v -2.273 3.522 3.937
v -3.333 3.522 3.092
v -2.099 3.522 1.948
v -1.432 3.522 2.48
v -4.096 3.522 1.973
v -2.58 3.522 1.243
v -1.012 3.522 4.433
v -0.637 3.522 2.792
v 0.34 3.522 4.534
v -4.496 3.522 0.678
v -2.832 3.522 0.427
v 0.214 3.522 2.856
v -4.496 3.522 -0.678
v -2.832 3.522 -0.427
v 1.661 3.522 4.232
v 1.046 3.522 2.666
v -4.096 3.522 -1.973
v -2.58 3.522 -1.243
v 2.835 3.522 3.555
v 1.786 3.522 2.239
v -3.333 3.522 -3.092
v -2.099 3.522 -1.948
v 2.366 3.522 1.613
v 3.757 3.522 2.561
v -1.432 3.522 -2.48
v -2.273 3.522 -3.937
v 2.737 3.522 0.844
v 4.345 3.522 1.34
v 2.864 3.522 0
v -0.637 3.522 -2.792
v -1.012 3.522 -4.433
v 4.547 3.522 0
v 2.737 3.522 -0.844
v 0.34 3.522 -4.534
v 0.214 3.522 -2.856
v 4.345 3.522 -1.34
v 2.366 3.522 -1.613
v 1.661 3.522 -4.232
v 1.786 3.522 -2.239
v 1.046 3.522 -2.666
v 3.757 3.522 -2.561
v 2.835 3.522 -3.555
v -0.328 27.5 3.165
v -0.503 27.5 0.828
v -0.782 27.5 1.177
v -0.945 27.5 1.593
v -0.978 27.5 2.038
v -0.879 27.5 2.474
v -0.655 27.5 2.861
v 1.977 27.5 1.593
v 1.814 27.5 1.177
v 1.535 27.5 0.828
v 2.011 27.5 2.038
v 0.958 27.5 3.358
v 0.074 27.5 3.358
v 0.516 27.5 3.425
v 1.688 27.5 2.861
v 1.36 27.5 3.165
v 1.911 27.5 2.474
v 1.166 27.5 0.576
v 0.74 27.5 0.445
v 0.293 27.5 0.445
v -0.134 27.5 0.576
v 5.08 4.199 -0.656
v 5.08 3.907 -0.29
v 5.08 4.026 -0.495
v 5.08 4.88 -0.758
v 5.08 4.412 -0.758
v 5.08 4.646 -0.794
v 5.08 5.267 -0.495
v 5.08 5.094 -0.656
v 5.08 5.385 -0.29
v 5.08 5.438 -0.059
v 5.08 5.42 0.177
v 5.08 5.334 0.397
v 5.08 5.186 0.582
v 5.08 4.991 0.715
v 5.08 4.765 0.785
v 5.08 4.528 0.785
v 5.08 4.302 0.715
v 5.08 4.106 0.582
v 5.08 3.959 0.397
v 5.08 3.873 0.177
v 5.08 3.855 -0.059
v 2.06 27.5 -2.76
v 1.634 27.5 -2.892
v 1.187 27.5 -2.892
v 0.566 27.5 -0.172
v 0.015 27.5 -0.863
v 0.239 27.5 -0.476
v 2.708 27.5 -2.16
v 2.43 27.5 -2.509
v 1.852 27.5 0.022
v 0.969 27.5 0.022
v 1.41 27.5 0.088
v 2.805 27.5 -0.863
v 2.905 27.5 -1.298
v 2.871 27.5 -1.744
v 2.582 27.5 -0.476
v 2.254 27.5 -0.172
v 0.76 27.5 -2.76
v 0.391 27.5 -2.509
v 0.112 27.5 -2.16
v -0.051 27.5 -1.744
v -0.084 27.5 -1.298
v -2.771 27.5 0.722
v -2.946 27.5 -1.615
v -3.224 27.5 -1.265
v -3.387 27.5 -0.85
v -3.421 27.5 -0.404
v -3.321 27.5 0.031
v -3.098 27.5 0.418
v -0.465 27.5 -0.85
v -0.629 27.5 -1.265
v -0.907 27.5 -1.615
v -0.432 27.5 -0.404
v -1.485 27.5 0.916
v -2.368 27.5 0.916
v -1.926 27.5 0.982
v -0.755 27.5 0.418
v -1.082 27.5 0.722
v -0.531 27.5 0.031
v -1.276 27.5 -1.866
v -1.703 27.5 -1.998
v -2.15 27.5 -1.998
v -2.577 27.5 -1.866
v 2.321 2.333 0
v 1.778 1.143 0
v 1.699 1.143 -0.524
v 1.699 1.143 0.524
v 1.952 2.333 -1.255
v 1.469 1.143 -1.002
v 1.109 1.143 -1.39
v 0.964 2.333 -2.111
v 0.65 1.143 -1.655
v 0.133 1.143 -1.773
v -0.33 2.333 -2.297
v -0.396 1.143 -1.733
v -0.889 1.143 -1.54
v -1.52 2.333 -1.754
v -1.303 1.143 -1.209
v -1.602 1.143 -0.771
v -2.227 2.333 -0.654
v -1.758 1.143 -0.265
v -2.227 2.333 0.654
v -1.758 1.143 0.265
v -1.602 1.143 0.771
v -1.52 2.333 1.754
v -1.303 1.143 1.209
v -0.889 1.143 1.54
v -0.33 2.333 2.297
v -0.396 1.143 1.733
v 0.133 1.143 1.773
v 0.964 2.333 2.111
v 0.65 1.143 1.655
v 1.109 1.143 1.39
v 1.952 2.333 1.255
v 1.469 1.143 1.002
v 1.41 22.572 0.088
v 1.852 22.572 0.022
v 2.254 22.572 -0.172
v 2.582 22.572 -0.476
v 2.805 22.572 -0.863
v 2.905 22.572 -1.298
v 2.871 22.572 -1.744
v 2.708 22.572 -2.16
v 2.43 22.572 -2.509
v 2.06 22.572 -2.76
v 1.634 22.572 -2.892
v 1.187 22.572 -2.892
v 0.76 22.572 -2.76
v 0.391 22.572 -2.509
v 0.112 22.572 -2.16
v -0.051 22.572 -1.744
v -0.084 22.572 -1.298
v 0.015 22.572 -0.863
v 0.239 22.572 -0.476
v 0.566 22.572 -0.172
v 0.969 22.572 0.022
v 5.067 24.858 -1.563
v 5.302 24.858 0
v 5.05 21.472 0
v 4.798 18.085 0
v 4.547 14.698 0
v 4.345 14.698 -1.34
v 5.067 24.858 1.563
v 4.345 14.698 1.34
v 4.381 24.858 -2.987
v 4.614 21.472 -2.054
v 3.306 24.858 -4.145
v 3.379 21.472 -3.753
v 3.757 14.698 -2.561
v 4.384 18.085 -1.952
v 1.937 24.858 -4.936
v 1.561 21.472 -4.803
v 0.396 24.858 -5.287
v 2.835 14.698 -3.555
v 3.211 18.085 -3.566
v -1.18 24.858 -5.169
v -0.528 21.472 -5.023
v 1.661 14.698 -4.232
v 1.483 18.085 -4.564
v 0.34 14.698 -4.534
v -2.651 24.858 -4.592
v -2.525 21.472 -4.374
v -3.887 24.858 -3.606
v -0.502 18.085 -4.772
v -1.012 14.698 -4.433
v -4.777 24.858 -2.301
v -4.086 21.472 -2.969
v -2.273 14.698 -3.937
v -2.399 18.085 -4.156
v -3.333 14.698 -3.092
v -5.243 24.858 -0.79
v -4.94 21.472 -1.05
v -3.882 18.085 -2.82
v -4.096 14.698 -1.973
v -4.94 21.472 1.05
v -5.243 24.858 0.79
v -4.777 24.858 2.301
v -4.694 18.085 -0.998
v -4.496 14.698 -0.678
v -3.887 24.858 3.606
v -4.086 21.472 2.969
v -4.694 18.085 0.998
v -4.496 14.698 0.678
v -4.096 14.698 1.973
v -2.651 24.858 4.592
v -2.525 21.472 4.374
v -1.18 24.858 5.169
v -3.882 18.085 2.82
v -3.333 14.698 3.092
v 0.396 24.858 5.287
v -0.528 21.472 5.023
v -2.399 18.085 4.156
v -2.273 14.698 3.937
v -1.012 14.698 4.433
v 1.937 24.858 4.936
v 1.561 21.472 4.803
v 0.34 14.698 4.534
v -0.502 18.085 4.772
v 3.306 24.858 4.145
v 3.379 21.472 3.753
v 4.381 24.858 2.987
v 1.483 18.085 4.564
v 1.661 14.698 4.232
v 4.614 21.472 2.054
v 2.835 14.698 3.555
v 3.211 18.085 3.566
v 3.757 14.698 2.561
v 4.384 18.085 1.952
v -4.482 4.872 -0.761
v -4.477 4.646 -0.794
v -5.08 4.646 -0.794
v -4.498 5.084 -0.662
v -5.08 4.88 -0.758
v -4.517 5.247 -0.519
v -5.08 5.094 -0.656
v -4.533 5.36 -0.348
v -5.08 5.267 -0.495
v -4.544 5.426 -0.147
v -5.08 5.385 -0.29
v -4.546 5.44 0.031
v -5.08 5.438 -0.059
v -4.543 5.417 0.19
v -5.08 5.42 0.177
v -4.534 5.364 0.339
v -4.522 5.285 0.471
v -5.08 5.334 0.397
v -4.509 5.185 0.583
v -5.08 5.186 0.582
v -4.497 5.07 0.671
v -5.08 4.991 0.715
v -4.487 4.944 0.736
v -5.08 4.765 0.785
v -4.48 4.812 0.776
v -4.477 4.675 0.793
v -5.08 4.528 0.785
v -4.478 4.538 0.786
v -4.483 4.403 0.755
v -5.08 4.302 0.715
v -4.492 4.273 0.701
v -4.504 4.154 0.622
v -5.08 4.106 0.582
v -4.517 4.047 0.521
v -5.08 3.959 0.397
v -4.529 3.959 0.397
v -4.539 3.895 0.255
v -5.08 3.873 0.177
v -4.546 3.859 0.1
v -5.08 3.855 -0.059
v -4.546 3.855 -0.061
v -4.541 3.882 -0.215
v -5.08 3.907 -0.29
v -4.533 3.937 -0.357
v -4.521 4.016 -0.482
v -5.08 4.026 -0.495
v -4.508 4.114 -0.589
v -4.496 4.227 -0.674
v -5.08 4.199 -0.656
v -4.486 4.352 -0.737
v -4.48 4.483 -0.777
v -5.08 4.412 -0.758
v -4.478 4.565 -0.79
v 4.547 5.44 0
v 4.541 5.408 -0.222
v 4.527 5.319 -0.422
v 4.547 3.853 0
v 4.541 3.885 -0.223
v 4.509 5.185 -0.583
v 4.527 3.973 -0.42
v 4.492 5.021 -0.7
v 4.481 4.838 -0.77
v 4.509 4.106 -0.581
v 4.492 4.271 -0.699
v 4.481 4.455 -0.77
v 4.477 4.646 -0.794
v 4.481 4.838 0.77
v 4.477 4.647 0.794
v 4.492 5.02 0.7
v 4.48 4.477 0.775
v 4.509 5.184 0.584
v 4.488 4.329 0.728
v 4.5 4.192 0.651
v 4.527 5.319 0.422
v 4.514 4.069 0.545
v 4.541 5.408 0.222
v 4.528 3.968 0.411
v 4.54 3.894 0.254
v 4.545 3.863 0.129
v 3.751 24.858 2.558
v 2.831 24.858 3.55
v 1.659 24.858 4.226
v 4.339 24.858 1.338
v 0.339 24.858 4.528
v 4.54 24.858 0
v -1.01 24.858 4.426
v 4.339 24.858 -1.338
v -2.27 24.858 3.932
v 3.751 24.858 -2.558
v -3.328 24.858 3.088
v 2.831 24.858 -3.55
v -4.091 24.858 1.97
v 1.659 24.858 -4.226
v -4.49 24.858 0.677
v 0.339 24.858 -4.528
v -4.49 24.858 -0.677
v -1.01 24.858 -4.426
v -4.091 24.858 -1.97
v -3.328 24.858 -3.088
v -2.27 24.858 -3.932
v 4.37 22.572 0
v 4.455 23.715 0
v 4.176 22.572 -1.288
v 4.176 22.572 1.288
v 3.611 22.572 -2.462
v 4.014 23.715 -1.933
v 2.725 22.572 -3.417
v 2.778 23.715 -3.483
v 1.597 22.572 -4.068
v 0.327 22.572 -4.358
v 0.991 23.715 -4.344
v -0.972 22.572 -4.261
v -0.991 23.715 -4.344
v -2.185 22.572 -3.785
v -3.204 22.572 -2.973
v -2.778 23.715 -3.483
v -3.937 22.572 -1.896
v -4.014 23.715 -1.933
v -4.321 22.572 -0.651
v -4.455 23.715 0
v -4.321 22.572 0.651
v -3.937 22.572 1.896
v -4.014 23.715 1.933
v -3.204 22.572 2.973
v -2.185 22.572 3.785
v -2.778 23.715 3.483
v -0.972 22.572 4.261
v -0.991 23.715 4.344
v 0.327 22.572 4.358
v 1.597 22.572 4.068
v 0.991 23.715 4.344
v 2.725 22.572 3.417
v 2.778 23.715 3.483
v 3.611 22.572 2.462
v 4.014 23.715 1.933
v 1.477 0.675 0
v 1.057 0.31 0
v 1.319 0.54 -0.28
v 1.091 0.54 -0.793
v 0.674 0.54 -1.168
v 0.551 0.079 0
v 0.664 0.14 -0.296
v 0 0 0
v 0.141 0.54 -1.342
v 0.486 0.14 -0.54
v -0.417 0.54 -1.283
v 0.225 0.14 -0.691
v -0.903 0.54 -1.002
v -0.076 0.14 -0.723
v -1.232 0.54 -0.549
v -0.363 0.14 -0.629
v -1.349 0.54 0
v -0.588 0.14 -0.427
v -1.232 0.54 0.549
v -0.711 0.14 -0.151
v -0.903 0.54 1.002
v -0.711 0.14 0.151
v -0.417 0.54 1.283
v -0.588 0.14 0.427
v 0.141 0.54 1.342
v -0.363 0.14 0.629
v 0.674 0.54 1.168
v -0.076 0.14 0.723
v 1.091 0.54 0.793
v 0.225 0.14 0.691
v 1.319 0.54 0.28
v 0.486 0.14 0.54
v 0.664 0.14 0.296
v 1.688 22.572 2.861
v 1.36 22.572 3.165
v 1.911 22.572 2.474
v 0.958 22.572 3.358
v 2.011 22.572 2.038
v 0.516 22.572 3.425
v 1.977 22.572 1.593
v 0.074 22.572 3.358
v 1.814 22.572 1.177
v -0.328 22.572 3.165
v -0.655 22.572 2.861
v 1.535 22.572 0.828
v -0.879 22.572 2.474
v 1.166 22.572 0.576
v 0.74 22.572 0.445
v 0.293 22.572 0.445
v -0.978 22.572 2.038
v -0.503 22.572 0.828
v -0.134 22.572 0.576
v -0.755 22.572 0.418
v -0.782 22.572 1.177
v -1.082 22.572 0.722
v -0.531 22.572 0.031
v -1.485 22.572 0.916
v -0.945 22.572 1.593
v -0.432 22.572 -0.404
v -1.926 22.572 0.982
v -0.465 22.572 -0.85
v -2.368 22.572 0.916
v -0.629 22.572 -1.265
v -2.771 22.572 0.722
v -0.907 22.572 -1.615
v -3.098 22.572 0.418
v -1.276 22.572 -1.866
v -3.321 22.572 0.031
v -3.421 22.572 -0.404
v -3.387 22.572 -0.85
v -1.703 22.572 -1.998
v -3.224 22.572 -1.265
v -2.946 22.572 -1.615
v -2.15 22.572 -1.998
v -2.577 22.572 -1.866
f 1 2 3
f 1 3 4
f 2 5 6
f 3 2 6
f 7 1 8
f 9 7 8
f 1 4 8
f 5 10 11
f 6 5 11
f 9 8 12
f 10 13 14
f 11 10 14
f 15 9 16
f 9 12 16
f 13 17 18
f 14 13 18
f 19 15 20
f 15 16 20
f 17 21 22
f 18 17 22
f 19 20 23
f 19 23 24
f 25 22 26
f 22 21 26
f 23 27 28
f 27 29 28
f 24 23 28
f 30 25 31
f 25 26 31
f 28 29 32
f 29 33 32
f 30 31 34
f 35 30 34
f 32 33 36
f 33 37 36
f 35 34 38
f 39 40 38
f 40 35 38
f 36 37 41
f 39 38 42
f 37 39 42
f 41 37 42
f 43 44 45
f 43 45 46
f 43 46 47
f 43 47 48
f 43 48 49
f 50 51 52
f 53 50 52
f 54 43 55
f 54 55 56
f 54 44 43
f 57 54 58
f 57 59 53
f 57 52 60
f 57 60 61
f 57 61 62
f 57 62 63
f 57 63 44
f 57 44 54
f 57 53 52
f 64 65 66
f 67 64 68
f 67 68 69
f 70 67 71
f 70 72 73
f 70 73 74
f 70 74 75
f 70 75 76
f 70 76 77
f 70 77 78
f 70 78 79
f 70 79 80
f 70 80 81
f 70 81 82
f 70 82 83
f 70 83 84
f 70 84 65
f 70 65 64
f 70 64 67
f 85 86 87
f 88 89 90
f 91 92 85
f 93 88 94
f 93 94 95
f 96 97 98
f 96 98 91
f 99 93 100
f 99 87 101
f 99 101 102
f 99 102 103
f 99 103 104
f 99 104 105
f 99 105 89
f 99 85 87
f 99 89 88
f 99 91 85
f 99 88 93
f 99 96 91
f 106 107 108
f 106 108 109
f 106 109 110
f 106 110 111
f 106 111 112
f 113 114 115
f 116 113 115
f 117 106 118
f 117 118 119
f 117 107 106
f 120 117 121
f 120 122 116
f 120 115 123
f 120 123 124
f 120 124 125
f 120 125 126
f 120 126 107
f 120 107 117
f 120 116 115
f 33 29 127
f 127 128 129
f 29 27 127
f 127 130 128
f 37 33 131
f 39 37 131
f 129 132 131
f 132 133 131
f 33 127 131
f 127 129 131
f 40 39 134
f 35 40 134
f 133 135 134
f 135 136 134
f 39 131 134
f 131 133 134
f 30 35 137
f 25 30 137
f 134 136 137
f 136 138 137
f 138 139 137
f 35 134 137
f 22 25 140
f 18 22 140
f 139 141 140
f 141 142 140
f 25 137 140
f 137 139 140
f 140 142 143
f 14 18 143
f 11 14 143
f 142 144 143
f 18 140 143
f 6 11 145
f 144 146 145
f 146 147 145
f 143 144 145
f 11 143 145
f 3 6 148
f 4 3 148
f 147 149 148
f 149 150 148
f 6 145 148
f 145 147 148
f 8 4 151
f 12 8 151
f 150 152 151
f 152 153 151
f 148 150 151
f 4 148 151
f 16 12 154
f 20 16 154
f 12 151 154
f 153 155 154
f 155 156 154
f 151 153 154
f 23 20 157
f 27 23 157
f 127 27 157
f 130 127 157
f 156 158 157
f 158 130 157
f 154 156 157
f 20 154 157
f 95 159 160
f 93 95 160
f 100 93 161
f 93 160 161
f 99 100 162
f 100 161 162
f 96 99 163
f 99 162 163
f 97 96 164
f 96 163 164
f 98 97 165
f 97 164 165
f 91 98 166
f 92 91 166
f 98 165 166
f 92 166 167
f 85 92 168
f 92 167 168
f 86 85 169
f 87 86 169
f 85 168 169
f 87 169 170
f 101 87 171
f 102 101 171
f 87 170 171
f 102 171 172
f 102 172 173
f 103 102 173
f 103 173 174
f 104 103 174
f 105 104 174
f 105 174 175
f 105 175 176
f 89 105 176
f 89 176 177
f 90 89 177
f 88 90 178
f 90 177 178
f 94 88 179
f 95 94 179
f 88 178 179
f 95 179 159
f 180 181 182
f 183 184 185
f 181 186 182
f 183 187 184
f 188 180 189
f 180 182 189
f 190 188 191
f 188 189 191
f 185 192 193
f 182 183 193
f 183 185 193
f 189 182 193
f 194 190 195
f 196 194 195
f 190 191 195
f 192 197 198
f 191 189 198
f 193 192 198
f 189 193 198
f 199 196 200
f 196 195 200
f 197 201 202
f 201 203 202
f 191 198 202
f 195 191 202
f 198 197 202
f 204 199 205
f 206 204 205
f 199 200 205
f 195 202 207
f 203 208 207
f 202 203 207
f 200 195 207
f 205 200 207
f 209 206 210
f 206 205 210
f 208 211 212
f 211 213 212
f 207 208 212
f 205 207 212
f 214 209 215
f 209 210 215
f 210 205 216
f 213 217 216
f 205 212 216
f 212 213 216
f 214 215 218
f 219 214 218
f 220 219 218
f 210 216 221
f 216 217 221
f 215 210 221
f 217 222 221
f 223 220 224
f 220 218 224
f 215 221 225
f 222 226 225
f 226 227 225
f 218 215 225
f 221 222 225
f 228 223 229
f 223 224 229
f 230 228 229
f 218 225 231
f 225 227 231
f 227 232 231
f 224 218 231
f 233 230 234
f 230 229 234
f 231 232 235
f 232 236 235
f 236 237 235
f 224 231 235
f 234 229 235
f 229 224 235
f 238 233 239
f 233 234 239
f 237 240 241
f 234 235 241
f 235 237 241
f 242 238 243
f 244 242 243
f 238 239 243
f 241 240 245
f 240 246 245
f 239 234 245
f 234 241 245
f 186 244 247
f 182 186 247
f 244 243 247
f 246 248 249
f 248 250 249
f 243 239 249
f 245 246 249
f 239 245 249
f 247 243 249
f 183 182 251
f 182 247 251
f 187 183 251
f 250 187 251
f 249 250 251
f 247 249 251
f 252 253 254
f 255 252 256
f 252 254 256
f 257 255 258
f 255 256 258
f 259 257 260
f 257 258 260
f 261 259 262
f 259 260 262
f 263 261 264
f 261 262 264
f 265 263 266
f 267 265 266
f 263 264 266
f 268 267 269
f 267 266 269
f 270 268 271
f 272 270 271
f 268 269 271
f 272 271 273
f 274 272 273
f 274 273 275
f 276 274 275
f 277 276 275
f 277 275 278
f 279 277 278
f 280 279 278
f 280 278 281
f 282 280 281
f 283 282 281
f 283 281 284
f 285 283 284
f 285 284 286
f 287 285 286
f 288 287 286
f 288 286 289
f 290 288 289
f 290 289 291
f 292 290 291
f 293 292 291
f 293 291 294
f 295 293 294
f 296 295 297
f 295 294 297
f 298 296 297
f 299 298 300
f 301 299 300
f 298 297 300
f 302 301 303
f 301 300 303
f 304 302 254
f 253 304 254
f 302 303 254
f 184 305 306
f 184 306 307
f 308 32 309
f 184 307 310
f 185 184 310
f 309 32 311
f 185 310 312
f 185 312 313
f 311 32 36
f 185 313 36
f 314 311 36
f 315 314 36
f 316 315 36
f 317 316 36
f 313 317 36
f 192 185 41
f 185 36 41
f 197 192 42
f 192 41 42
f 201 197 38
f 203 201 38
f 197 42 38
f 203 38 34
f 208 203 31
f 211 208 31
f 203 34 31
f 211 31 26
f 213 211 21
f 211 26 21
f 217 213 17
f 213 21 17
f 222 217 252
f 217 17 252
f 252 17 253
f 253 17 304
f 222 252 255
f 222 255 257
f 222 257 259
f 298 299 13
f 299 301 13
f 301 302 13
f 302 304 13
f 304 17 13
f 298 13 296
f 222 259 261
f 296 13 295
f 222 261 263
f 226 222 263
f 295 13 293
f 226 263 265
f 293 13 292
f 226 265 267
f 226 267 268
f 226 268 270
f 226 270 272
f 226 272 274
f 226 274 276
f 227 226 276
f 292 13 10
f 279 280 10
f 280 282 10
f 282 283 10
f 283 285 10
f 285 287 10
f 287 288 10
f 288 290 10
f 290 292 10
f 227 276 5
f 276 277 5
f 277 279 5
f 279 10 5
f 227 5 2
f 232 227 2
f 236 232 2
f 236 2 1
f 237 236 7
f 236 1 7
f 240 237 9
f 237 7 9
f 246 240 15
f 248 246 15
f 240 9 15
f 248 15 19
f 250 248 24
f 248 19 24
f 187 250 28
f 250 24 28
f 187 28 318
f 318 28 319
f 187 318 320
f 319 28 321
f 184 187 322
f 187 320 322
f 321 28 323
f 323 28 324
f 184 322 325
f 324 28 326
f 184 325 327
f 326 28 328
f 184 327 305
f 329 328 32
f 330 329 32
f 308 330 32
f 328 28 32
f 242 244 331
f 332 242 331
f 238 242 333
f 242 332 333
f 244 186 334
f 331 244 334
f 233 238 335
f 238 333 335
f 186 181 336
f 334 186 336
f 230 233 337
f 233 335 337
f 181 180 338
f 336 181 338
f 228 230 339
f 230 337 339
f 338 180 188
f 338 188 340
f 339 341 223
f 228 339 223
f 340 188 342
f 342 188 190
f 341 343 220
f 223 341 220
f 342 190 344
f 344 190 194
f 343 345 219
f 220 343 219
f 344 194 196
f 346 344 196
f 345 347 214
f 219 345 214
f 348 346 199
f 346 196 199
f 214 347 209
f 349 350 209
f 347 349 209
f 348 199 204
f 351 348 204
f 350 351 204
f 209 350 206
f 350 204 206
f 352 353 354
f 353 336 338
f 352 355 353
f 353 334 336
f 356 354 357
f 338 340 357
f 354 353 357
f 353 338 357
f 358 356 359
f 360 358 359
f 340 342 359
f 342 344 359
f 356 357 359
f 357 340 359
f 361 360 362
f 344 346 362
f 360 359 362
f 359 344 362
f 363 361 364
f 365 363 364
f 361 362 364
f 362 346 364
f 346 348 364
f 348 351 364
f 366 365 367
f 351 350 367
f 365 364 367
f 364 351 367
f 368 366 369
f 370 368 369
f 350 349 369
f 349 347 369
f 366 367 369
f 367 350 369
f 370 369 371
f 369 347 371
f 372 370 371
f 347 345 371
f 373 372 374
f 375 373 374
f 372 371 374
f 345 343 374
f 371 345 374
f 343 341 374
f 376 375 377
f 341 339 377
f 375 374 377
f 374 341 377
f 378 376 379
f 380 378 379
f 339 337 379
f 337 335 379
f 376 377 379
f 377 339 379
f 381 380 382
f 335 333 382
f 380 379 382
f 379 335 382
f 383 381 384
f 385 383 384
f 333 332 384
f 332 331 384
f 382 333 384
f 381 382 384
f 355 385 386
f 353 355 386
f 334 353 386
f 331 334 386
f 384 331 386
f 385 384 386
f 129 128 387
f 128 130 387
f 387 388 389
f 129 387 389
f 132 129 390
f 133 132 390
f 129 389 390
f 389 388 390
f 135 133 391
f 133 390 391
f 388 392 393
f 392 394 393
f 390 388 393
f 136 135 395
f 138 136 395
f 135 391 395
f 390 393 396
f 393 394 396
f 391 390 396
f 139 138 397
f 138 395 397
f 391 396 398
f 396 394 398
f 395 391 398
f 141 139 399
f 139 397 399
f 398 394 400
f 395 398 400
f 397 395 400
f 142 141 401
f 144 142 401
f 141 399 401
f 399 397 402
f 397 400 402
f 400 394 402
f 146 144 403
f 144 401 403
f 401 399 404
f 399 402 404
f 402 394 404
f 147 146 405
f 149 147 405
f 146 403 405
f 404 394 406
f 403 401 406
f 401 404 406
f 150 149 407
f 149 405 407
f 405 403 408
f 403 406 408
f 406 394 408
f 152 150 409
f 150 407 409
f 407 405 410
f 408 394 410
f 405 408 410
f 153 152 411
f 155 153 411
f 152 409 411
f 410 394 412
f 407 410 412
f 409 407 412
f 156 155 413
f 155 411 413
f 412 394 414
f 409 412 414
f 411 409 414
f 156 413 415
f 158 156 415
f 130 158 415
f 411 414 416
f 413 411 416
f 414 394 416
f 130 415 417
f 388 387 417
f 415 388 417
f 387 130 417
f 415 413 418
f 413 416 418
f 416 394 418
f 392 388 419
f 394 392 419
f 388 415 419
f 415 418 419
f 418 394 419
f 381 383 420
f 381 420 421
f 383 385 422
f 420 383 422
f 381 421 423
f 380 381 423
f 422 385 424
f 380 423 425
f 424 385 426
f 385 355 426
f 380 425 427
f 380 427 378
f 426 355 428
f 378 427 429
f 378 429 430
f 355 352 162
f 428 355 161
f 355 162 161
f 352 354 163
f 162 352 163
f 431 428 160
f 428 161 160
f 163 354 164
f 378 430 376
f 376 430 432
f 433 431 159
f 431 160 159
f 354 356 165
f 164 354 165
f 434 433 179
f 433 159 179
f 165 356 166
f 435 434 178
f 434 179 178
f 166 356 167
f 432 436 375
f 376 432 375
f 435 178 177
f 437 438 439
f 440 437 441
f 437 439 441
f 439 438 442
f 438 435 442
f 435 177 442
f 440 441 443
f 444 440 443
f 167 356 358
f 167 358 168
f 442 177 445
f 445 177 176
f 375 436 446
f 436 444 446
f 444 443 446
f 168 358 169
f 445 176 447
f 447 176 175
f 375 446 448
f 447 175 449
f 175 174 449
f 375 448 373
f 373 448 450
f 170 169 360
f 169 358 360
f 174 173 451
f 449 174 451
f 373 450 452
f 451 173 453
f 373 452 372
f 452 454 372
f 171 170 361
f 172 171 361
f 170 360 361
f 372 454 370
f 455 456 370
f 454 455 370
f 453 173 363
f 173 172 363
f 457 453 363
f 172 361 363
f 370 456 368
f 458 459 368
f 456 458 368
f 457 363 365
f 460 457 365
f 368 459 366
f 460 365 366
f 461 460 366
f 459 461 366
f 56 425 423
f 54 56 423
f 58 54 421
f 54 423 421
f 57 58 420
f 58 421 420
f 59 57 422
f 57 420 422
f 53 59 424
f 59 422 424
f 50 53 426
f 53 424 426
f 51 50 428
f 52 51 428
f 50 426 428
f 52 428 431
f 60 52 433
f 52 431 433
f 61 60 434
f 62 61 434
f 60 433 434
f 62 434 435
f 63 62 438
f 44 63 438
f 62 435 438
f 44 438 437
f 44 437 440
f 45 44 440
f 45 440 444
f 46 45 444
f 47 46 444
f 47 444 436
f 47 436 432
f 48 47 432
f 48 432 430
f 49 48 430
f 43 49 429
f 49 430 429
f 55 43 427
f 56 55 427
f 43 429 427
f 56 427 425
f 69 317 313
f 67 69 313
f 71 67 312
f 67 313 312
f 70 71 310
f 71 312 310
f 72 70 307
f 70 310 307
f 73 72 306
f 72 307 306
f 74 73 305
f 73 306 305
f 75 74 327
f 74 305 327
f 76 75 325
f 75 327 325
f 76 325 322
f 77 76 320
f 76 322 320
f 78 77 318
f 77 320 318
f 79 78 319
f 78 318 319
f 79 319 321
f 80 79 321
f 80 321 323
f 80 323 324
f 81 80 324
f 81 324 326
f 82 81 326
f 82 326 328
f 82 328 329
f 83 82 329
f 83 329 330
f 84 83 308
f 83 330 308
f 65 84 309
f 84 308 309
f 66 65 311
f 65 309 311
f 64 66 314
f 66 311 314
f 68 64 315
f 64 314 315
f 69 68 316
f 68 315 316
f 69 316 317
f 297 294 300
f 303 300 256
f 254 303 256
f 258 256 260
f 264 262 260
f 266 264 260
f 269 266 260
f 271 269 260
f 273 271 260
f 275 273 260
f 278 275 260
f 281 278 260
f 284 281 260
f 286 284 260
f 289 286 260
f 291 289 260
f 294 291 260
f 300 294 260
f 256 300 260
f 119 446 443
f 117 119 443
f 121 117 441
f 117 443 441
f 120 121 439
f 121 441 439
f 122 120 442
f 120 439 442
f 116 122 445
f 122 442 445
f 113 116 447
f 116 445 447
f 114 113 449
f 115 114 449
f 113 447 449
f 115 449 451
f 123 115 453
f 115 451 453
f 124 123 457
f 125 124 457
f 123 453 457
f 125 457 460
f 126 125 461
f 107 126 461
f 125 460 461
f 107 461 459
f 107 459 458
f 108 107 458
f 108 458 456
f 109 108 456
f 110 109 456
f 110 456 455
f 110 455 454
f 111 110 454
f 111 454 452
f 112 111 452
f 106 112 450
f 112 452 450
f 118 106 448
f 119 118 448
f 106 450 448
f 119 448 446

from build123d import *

# Parameters (mm, degrees)
BOSS_EXTRUDE1_DEPTH      = 5.08
BOSS_EXTRUDE1_DEPTH_BACK = 5.08
SKETCH2_R                = 0.79375
SKETCH3_R                = 1.4986
BOSS_EXTRUDE3_DEPTH      = 4.9276


with BuildPart() as part:
    # Sketch1 → Revolve1 (revolve)
    with BuildSketch(Plane.XY):
        with BuildLine():
            Line((0, 0), (0, 22.572427826))
            Line((0, 22.572427826), (4.37022875, 22.572427826))
            Line((4.37022875, 22.572427826), (4.54025, 24.858427826))
            Line((4.54025, 24.858427826), (5.30225, 24.858427826))
            Line((5.30225, 24.858427826), (4.5466, 14.698427826))
            Line((4.5466, 14.698427826), (4.5466, 3.522427826))
            Line((4.5466, 3.522427826), (2.86385, 3.522427826))
            Line((2.86385, 3.522427826), (1.778, 1.143))
            ThreePointArc((1.778, 1.143), (1.056850628, 0.310399023), (0, 0))
        make_face()
    revolve(axis=Axis((0, 0, 0), (0, 1, 0)))

    # Sketch2 → Boss-Extrude1 (add, two sides: drawn at the far end of the back side and taken through both)
    with BuildSketch(Plane(origin=(0, 0, 0), x_dir=(0, 0, -1), z_dir=(1, 0, 0)).offset(-BOSS_EXTRUDE1_DEPTH_BACK)):
        with Locations((0, 4.646377826)):
            Circle(SKETCH2_R)
    extrude(amount=BOSS_EXTRUDE1_DEPTH + BOSS_EXTRUDE1_DEPTH_BACK)

    # Sketch3 → Boss-Extrude3 (add)
    with BuildSketch(Plane(origin=(0, 22.572427826, 0), x_dir=(1, 0, 0), z_dir=(0, 1, 0))):
        with Locations(Location((-1.92644128, 0.516188385, 0), (0, 0, 270))):
            Circle(SKETCH3_R)
        with Locations(Location((1.410252895, 1.410252895, 0), (0, 0, 270))):
            Circle(SKETCH3_R)
        with Locations(Location((0.516188385, -1.92644128, 0), (0, 0, 270))):
            Circle(SKETCH3_R)
    extrude(amount=BOSS_EXTRUDE3_DEPTH)


solid = part.part
